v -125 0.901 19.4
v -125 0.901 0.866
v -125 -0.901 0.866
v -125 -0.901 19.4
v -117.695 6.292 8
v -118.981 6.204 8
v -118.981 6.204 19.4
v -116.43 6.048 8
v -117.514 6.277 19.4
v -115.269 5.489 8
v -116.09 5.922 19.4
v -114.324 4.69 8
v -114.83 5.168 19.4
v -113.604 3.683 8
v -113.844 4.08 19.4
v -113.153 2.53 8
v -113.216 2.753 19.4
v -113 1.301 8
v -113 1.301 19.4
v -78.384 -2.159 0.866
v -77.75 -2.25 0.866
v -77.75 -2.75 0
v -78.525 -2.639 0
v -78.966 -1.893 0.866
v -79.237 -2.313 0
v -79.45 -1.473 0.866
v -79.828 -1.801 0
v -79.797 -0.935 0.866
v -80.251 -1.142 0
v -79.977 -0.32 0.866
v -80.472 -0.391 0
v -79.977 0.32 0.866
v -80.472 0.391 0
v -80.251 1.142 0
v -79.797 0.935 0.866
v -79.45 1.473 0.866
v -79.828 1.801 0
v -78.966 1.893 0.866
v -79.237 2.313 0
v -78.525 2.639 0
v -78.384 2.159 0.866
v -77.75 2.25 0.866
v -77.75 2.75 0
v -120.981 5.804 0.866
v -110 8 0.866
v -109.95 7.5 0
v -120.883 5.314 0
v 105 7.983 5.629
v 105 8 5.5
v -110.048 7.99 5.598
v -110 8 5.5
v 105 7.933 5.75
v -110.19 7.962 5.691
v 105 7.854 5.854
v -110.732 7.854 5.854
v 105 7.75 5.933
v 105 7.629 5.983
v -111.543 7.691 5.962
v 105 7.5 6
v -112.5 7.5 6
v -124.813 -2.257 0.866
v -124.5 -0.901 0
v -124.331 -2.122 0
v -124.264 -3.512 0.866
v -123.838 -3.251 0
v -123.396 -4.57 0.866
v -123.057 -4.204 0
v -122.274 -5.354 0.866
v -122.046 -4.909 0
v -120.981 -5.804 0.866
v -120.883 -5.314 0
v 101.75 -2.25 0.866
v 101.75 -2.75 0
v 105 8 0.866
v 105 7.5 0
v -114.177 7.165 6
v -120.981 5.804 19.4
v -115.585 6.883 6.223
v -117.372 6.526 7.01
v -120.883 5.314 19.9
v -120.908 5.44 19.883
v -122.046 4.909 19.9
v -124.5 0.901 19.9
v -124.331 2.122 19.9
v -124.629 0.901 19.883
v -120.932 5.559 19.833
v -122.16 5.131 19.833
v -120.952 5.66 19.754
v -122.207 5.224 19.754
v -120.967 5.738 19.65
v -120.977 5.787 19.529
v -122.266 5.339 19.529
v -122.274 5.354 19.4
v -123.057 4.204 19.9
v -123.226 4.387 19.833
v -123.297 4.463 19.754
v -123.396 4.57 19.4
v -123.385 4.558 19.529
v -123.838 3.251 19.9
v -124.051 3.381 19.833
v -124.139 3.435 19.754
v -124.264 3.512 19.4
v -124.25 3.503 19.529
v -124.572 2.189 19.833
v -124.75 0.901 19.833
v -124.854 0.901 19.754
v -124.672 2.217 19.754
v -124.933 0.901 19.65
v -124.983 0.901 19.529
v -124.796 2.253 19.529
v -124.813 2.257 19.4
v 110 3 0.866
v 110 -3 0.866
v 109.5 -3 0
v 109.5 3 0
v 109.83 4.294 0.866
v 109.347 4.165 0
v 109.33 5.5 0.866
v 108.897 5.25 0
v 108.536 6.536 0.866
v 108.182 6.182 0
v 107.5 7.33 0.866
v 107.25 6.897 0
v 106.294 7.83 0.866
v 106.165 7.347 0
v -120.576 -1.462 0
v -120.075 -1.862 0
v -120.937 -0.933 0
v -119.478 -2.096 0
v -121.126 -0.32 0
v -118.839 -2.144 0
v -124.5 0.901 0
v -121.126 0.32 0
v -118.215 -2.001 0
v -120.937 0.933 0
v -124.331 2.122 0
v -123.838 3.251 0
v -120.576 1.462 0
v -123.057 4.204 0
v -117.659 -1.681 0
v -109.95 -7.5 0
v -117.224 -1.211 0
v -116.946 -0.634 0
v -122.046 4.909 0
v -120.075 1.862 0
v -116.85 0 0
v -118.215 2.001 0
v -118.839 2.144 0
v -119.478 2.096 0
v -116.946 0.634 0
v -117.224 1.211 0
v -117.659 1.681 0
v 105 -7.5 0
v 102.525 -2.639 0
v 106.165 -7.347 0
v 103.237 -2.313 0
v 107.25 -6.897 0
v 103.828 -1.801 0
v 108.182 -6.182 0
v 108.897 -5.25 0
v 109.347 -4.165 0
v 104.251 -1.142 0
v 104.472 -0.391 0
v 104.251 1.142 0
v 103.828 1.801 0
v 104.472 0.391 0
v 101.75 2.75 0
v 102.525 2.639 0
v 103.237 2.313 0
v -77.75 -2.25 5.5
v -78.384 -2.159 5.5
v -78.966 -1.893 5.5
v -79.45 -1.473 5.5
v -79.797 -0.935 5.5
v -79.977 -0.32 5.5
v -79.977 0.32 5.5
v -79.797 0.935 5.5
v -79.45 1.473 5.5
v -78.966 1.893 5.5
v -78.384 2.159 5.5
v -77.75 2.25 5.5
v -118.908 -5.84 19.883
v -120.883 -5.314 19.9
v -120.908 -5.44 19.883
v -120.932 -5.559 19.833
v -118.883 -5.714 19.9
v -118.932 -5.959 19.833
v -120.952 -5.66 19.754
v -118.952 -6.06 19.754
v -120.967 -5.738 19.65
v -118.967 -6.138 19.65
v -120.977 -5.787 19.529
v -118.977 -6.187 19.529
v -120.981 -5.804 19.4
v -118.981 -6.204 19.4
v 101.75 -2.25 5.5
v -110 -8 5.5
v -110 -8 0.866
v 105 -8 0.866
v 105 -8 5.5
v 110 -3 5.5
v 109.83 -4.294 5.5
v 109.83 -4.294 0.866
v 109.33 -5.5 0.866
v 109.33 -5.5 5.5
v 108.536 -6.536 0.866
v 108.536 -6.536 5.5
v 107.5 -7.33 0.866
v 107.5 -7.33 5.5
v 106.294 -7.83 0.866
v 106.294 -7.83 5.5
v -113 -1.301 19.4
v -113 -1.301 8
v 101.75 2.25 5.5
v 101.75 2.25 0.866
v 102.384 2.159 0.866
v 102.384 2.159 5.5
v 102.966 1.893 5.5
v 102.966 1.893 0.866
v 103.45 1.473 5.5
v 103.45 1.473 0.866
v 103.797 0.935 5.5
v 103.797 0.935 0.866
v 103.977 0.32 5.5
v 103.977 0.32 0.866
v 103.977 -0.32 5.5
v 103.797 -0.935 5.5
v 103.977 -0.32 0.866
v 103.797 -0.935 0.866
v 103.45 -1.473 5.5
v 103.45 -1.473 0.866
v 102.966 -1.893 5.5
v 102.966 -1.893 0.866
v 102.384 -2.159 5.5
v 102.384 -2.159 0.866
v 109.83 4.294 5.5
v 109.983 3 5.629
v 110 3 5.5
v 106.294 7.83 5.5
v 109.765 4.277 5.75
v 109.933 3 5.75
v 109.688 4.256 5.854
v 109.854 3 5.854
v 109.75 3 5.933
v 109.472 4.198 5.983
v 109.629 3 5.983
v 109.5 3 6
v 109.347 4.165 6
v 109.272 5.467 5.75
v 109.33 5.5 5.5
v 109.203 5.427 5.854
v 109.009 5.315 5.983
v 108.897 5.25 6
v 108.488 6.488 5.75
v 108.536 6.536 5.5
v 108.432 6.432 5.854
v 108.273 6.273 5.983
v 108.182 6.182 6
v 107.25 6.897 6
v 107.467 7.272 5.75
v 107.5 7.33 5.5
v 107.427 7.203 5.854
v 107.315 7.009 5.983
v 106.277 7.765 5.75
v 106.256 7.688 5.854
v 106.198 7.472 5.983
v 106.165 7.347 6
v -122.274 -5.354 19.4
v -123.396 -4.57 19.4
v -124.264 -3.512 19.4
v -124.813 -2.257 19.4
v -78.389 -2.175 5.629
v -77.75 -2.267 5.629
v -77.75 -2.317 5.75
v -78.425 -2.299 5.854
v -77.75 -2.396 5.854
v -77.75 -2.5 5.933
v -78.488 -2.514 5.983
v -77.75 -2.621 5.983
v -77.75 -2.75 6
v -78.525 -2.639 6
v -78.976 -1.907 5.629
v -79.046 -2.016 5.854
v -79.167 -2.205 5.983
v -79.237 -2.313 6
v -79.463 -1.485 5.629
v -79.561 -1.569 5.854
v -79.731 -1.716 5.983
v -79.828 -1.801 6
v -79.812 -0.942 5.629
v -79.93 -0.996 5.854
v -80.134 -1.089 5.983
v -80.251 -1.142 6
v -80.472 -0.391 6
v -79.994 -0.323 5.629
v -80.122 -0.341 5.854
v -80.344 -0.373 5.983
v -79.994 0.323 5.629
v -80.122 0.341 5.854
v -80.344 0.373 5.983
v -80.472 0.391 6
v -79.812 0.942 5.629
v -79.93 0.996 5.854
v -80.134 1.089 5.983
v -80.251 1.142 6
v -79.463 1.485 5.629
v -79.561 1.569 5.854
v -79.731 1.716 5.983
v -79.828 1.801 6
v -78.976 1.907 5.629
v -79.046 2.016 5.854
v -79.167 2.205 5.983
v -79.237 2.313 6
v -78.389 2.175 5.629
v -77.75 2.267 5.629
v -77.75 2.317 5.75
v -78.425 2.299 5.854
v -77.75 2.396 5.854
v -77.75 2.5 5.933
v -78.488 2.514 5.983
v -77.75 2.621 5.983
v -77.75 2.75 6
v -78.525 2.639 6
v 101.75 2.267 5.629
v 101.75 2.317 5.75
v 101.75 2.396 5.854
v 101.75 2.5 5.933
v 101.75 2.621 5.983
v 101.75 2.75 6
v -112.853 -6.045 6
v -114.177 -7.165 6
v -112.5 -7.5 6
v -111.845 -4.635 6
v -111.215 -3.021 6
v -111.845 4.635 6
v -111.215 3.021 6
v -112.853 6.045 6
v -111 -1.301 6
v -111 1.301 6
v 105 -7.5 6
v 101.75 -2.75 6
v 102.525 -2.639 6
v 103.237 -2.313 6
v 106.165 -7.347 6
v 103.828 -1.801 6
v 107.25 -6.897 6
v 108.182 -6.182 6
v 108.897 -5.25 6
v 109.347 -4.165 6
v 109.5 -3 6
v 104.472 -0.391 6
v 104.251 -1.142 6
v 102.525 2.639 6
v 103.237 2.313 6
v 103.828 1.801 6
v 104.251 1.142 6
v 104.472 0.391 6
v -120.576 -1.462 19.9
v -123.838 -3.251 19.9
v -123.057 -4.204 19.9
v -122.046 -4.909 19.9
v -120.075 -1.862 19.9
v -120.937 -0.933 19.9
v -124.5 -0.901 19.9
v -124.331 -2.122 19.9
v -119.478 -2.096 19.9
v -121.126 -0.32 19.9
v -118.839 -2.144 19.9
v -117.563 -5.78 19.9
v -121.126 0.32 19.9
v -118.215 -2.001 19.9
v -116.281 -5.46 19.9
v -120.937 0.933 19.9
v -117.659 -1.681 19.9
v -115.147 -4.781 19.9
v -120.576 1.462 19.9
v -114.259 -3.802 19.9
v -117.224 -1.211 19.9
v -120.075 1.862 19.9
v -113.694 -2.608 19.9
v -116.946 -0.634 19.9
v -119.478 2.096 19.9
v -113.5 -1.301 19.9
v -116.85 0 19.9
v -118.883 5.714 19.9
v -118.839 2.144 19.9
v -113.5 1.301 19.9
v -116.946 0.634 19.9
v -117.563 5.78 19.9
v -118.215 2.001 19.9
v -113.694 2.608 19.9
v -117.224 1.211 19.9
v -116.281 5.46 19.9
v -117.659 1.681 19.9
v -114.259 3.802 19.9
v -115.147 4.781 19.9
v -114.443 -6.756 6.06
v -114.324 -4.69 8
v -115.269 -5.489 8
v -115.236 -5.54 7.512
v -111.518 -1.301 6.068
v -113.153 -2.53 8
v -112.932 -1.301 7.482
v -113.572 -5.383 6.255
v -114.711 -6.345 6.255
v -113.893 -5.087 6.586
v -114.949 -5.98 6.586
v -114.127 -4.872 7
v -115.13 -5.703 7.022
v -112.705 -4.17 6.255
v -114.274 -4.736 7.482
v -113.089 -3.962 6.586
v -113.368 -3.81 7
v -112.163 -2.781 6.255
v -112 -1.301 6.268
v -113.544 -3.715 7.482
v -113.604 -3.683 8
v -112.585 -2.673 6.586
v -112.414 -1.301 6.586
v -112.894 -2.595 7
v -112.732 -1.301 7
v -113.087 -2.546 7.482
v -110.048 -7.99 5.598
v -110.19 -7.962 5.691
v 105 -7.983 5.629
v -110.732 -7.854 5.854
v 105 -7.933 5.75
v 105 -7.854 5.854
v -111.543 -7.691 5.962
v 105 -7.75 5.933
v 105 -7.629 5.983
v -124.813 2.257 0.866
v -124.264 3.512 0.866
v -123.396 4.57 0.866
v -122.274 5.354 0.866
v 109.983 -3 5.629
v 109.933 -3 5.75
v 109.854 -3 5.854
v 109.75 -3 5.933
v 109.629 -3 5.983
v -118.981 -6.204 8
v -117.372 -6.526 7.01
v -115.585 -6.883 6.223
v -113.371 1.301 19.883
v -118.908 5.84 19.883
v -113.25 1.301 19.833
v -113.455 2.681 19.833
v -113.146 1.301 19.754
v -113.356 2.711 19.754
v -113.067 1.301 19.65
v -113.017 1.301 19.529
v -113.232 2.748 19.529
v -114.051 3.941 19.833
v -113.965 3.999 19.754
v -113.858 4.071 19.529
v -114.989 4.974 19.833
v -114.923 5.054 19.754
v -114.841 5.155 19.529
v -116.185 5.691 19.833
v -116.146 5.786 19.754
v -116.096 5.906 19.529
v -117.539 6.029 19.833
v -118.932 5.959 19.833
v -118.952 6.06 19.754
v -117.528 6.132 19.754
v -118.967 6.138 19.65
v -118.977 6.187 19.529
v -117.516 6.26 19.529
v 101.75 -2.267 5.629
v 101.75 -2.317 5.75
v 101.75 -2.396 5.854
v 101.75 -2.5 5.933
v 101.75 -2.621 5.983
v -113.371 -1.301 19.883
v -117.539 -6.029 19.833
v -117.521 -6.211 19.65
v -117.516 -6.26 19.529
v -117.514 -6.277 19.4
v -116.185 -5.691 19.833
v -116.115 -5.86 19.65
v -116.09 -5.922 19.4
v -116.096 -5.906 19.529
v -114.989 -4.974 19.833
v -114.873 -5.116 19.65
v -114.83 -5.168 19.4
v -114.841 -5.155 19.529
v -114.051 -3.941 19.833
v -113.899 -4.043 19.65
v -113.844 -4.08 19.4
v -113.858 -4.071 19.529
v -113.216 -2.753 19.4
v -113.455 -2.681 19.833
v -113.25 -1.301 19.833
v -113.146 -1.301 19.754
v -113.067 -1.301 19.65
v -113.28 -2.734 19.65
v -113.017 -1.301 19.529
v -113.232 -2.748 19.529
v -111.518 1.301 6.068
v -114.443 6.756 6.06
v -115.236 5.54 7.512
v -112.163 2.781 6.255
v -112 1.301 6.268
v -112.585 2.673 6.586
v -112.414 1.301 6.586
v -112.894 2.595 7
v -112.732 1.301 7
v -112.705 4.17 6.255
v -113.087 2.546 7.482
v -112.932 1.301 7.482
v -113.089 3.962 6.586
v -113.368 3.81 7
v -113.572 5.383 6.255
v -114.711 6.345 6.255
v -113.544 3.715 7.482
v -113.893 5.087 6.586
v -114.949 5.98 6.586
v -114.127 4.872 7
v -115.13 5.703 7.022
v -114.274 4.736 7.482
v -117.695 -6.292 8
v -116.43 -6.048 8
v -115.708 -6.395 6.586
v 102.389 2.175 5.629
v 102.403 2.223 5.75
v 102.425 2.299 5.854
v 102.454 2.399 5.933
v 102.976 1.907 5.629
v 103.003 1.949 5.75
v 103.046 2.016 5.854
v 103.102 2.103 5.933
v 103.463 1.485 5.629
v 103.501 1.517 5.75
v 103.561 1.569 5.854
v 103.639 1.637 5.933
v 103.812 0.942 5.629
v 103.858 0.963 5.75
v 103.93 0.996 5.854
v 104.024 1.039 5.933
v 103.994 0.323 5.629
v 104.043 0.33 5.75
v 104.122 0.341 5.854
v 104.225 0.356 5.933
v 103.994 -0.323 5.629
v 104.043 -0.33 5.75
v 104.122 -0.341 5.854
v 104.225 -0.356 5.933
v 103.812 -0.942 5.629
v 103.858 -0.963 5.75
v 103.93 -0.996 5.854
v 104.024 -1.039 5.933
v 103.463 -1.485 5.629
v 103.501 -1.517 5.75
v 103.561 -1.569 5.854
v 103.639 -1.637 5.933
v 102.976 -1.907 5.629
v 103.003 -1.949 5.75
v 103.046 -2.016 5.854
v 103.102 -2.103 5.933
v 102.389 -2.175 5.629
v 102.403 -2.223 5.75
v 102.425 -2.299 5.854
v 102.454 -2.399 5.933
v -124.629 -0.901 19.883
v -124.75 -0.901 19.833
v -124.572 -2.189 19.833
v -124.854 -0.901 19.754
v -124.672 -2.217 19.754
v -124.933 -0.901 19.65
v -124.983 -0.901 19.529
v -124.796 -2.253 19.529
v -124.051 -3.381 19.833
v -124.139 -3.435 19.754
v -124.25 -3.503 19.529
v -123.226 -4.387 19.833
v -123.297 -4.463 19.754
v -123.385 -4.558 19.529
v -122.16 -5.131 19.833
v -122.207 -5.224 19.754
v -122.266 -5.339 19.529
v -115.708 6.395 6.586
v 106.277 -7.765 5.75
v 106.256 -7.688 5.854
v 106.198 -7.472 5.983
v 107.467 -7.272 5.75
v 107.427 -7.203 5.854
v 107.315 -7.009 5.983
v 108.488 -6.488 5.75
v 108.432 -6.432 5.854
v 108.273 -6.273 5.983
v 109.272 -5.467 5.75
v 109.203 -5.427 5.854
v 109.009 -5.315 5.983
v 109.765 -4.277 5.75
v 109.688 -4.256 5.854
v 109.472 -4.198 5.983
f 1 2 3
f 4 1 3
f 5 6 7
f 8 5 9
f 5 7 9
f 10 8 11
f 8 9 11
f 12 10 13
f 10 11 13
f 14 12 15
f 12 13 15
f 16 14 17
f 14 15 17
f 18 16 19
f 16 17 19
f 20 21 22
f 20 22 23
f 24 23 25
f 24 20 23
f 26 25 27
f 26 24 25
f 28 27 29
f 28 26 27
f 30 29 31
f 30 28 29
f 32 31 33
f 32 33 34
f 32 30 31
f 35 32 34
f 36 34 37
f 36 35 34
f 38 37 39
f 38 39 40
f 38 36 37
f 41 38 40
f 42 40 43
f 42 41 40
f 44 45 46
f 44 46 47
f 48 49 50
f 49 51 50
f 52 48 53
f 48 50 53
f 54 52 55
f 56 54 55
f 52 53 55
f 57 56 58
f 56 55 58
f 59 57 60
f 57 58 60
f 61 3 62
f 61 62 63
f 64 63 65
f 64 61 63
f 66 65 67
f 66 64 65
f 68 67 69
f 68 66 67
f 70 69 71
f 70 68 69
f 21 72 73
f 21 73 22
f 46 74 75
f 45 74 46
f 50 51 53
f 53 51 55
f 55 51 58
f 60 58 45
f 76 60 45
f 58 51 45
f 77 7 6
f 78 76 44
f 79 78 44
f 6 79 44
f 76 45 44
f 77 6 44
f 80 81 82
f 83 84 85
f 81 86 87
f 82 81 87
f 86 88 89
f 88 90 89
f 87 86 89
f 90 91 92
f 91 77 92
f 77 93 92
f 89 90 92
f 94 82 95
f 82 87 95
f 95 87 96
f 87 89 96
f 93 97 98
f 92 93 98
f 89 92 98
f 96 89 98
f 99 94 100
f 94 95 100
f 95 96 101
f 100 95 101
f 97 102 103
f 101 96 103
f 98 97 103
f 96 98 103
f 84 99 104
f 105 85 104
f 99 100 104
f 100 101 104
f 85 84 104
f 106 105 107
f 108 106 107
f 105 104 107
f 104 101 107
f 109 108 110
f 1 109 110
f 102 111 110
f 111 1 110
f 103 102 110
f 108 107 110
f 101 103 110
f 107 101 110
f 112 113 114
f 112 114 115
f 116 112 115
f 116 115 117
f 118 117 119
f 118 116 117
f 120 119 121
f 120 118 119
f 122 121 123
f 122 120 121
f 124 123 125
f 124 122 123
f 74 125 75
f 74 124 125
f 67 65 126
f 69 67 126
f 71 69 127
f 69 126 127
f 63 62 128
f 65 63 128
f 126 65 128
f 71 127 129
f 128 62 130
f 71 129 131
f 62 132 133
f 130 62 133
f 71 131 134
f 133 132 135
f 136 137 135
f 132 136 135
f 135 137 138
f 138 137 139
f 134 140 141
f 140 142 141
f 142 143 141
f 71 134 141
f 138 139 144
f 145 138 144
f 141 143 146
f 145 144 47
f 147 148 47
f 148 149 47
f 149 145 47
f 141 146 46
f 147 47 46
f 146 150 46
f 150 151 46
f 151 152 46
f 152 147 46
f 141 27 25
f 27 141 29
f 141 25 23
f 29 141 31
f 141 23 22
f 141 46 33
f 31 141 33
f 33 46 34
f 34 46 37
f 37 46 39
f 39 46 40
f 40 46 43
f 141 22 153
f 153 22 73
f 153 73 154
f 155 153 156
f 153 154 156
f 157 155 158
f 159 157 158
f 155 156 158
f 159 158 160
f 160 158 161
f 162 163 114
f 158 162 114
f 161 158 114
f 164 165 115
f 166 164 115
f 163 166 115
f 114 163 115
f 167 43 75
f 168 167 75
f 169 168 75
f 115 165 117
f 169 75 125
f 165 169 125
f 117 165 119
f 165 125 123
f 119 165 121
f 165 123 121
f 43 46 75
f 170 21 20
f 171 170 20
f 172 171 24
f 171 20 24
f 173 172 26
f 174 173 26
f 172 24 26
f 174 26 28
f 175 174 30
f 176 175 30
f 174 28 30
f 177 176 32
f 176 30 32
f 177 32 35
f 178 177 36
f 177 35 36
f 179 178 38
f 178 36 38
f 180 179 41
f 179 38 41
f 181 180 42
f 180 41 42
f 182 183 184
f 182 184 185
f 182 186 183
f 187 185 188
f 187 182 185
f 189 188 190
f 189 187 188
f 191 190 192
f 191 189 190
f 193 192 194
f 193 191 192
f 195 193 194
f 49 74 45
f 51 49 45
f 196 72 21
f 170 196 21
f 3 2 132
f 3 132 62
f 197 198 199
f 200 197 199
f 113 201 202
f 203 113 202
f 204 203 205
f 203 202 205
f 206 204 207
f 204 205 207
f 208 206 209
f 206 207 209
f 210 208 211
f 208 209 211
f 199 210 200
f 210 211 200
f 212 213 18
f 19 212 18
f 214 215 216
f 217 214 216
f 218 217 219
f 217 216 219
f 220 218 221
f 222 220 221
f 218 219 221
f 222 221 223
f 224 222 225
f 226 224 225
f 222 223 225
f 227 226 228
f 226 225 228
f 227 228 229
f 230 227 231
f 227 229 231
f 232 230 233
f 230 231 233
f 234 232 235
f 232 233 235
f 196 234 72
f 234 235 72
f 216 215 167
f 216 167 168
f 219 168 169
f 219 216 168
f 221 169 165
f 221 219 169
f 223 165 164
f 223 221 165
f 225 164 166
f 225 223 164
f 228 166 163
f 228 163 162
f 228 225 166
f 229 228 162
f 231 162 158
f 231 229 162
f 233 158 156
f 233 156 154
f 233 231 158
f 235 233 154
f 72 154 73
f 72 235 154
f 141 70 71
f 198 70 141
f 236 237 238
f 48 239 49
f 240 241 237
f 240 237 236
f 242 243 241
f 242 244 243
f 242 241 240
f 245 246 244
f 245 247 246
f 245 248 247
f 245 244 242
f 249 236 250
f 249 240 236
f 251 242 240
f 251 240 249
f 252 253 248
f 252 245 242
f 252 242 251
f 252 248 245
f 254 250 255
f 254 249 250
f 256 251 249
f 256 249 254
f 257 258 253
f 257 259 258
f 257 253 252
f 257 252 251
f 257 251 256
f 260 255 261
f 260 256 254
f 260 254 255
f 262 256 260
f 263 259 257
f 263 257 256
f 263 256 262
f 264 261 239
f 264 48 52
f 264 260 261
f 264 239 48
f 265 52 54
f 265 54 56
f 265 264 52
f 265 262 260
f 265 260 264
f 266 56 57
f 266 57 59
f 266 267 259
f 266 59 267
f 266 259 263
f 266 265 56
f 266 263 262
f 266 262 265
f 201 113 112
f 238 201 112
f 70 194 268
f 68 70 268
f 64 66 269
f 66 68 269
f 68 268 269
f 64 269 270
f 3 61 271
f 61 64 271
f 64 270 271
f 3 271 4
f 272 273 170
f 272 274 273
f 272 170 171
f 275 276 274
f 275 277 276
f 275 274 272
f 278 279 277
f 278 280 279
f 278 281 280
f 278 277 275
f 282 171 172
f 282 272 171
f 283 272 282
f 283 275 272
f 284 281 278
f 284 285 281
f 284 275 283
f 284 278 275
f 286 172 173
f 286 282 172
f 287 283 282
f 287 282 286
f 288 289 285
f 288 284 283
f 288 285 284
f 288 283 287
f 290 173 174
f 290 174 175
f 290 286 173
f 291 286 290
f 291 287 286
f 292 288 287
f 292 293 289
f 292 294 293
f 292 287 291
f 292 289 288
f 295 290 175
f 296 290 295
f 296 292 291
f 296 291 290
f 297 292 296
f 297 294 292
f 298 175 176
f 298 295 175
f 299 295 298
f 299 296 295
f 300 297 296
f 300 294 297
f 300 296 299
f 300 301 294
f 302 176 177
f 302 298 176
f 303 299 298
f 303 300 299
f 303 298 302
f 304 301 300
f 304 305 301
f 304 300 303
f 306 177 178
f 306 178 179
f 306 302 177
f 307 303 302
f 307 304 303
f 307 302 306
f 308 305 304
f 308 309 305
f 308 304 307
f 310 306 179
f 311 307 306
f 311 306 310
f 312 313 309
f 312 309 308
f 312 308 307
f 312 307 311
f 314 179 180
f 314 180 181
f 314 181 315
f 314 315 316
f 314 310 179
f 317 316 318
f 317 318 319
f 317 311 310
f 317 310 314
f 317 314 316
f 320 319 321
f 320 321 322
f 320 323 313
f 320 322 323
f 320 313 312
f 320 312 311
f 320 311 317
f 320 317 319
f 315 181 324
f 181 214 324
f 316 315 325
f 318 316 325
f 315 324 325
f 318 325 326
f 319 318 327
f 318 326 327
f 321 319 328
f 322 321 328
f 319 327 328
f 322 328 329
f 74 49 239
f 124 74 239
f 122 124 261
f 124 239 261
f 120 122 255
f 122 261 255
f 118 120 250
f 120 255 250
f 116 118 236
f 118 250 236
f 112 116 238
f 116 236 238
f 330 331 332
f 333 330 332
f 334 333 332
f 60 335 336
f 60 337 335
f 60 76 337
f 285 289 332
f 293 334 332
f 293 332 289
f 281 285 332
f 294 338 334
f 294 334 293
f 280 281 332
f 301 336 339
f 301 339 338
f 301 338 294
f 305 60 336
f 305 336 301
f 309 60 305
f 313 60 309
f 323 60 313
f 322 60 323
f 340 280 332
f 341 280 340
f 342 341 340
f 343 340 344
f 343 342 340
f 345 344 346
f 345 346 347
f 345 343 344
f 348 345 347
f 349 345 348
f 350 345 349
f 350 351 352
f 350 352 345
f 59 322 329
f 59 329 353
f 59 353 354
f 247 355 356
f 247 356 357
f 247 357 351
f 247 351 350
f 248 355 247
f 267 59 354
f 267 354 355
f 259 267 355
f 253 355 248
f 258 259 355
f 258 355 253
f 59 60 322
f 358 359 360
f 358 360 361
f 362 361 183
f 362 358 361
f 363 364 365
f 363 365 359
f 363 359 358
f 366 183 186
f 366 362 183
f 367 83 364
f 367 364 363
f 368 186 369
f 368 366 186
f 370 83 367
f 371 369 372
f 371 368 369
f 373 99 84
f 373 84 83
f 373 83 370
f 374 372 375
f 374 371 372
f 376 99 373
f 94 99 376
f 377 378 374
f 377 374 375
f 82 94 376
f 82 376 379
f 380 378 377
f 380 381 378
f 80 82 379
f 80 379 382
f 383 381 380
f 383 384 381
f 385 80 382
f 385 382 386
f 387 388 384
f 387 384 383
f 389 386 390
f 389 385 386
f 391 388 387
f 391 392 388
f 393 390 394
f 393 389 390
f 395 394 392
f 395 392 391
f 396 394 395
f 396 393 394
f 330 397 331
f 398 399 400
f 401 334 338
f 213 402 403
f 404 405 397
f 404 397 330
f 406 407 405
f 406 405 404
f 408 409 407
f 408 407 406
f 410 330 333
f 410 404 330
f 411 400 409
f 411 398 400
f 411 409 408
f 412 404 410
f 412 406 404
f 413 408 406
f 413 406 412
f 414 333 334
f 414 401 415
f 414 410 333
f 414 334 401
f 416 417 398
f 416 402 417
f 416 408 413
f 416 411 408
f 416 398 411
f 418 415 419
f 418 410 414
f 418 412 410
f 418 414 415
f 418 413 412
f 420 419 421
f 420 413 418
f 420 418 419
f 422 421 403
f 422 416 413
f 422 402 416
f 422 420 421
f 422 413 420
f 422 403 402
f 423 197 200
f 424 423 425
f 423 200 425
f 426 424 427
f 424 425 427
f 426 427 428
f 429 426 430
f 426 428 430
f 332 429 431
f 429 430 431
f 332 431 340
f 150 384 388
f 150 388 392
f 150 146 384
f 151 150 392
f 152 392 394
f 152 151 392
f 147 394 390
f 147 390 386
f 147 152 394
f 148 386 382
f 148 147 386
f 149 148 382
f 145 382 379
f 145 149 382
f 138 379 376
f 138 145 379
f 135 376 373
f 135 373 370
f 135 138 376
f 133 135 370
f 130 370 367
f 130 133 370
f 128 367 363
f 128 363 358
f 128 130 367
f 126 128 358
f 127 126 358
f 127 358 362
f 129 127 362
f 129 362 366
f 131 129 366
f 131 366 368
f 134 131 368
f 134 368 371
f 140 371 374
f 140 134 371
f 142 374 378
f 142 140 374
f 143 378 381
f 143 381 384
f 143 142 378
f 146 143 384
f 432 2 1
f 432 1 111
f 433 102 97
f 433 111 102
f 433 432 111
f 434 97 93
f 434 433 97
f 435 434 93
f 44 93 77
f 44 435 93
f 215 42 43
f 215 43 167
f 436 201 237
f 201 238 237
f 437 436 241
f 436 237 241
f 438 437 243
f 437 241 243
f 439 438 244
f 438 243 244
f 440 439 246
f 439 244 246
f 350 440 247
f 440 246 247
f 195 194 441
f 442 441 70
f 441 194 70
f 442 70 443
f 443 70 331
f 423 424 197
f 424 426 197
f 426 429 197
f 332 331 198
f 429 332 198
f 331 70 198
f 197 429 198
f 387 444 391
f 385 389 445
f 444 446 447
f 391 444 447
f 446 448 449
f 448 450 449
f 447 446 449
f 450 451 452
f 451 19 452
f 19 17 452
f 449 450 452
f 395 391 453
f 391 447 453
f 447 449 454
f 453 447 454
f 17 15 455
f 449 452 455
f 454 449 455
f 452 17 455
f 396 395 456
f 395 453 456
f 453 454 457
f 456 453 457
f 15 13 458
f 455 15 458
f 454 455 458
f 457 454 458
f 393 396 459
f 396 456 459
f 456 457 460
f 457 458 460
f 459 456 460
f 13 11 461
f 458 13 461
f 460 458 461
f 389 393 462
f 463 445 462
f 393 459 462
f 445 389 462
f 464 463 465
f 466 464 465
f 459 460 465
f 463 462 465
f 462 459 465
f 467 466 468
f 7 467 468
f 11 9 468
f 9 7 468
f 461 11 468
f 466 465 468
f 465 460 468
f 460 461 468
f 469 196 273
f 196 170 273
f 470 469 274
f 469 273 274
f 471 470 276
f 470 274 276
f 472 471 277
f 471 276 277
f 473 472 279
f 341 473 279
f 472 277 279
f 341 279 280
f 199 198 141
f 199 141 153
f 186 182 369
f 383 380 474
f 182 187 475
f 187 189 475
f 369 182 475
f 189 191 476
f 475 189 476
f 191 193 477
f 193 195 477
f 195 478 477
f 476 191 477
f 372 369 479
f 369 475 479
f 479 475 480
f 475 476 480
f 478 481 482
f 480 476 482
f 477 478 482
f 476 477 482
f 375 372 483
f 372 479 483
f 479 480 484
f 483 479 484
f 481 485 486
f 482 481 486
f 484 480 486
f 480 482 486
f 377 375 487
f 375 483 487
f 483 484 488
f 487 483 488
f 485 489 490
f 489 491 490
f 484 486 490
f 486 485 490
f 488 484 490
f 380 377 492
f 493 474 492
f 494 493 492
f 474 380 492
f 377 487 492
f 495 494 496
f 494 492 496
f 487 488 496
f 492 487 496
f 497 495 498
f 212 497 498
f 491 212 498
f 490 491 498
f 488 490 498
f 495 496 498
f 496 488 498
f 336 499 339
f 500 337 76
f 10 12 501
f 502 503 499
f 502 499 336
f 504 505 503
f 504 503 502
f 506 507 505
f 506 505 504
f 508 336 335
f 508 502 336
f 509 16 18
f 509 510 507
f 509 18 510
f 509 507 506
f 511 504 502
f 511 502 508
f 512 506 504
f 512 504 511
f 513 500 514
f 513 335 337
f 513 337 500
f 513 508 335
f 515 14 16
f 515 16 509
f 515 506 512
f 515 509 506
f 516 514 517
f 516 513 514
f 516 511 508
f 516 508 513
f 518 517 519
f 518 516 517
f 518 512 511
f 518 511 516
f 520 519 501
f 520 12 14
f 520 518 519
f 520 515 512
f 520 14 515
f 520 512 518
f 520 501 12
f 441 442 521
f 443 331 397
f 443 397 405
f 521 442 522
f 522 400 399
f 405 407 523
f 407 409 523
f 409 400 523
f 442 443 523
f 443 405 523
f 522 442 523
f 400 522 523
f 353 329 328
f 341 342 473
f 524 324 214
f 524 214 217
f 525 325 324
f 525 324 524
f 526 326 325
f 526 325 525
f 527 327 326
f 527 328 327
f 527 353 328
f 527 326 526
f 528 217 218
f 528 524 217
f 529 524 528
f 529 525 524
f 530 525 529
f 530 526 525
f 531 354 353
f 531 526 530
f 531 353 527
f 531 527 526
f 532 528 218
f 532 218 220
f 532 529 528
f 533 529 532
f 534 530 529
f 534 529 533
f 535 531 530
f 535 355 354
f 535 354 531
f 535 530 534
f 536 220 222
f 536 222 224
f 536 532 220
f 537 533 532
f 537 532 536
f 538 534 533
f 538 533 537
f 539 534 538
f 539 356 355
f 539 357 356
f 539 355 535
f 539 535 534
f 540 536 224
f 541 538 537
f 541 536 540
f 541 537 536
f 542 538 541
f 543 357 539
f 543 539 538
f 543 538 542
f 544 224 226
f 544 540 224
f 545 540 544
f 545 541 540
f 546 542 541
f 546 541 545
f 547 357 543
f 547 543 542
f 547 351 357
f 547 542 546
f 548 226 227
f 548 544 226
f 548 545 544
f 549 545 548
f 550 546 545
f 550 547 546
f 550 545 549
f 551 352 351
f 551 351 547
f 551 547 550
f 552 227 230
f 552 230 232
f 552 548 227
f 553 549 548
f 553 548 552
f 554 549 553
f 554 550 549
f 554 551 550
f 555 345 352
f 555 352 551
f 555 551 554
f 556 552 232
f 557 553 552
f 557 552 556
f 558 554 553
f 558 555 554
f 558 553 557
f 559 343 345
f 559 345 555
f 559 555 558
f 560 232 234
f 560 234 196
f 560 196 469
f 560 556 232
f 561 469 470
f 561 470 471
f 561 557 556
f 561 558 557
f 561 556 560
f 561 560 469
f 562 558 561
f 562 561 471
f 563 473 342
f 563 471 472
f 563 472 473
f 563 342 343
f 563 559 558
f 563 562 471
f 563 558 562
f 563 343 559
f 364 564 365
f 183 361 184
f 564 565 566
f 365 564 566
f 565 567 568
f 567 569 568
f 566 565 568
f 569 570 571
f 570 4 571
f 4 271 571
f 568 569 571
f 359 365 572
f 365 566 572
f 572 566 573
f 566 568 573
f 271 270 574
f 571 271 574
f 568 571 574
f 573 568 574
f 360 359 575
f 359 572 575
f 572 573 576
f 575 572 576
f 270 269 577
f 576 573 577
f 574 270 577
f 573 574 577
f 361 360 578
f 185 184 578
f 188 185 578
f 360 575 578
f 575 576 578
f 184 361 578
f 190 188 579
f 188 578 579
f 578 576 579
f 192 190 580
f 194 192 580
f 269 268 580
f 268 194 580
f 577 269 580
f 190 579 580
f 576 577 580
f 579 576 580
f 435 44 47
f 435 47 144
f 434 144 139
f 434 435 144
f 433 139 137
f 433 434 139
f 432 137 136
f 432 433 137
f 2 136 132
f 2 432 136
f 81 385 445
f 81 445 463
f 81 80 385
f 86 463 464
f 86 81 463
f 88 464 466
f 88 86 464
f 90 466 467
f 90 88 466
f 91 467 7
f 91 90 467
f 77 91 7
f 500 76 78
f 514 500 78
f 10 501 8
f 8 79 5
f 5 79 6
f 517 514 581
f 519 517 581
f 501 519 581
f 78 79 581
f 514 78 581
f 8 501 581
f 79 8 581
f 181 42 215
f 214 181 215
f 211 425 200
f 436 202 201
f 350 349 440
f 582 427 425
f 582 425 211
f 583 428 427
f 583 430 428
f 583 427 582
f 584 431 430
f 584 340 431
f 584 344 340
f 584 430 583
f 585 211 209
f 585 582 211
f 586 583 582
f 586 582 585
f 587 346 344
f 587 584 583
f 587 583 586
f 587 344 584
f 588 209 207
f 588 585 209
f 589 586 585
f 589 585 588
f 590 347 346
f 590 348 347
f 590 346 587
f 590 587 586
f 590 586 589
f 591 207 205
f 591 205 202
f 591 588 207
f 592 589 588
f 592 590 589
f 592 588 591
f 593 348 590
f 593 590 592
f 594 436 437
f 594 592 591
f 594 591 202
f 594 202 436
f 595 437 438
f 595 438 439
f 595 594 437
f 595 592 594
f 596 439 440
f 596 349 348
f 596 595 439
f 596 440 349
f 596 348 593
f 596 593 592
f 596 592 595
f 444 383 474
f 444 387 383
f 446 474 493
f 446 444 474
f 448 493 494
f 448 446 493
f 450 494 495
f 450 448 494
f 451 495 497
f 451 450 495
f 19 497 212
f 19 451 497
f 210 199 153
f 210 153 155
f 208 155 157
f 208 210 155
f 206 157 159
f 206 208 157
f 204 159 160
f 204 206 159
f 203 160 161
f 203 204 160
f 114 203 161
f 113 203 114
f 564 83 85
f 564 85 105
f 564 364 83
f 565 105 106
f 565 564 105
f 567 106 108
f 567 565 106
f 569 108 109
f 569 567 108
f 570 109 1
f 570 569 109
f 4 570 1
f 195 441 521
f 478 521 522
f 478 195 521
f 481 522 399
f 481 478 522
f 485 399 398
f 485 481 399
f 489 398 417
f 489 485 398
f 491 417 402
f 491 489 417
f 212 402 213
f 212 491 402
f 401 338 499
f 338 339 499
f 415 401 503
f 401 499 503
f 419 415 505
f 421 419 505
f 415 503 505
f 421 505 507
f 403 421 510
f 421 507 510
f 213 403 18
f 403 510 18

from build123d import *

# Parameters (mm, degrees)
SKETCH1_R           = 2.15
BOSS_EXTRUDE1_DEPTH = 6
SKETCH3_R           = 2.15
BOSS_EXTRUDE2_DEPTH = 13.9
FILLET1_R           = 5
FILLET2_R           = 5
CHAMFER1_SIZE       = 0.5
CHAMFER1_SIZE2      = 0.866025404
FILLET3_R           = 0.5
FILLET4_R           = 2
FILLET5_R           = 0.5


with BuildPart() as part:
    # Sketch1 → Boss-Extrude1 (new body)
    with BuildSketch(Plane.XY):
        Polygon((-110, -8), (110, -8), (110, 8), (-110, 8), (-125, 5), (-125, -5), align=None)
        with Locations((-119, 0)):
            Circle(SKETCH1_R, mode=Mode.SUBTRACT)
        with BuildLine():
            Line((101.75, -2.25), (-77.75, -2.25))
            ThreePointArc((-77.75, -2.25), (-80, 0), (-77.75, 2.25))
            Line((-77.75, 2.25), (101.75, 2.25))
            ThreePointArc((101.75, 2.25), (104, 0), (101.75, -2.25))
        make_face(mode=Mode.SUBTRACT)
    extrude(amount=BOSS_EXTRUDE1_DEPTH)

    # Sketch3 → Boss-Extrude2 (add)
    with BuildSketch(Plane.XY.offset(6)):
        Polygon((-125, 5), (-125, -5), (-113, -7.4), (-113, 7.4), align=None)
        with Locations((-119, 0)):
            Circle(SKETCH3_R, mode=Mode.SUBTRACT)
    extrude(amount=BOSS_EXTRUDE2_DEPTH)

    # Fillet1
    fillet1_edges = [part.edges().sort_by_distance(p)[0] for p in [
        (110, 8, 3),
        (110, -8, 3),
    ]]
    fillet(fillet1_edges, radius=FILLET1_R)

    # Fillet2
    fillet2_edges = [part.edges().sort_by_distance(p)[0] for p in [
        (-125, -5, 9.95),
        (-125, 5, 9.95),
        (-113, 7.4, 12.95),
        (-113, -7.4, 12.95),
    ]]
    fillet(fillet2_edges, radius=FILLET2_R)

    # Chamfer1
    chamfer1_edges = [part.edges().sort_by_distance(p)[0] for p in [
        (-115.490290338, 6.901941932, 0),
        (-2.5, 8, 0),
        (-2.5, -8, 0),
        (12, -2.25, 0),
        (104, 0, 0),
        (12, 2.25, 0),
        (-80, 0, 0),
        (110, 0, 0),
        (108.535533906, 6.535533906, 0),
        (108.535533906, -6.535533906, 0),
        (-115.490290338, -6.901941932, 0),
        (-125, 0, 0),
        (-123.866710707, 4.070925014, 0),
        (-123.866710707, -4.070925014, 0),
    ]]
    chamfer1_side = [part.faces().sort_by_distance(p)[0] for p in [
        (-115.028350448, -4.592242485, 0),
    ]]
    chamfer(chamfer1_edges, length=CHAMFER1_SIZE, length2=CHAMFER1_SIZE2, reference=chamfer1_side[0])

    # Fillet3
    fillet3_edges = [part.edges().sort_by_distance(p)[0] for p in [
        (12, 2.25, 6),
        (104, 0, 6),
        (12, -2.25, 6),
        (-2.5, -8, 6),
        (-2.5, 8, 6),
        (110, 0, 6),
        (108.535533906, 6.535533906, 6),
        (108.535533906, -6.535533906, 6),
        (-80, 0, 6),
    ]]
    fillet(fillet3_edges, radius=FILLET3_R)

    # Fillet4
    fillet4_edges = [part.edges().sort_by_distance(p)[0] for p in [
        (-113, 0, 6),
        (-114.830055472, -5.167691193, 6),
        (-114.830055472, 5.167691193, 6),
    ]]
    fillet(fillet4_edges, radius=FILLET4_R)

    # Fillet5
    fillet5_edges = [part.edges().sort_by_distance(p)[0] for p in [
        (-113, 0, 19.9),
        (-119.980580676, -6.003883865, 19.9),
        (-119.980580676, 6.003883865, 19.9),
        (-125, 0, 19.9),
        (-123.866710707, 4.070925014, 19.9),
        (-123.866710707, -4.070925014, 19.9),
        (-114.830055472, 5.167691193, 19.9),
        (-114.830055472, -5.167691193, 19.9),
    ]]
    fillet(fillet5_edges, radius=FILLET5_R)


solid = part.part
